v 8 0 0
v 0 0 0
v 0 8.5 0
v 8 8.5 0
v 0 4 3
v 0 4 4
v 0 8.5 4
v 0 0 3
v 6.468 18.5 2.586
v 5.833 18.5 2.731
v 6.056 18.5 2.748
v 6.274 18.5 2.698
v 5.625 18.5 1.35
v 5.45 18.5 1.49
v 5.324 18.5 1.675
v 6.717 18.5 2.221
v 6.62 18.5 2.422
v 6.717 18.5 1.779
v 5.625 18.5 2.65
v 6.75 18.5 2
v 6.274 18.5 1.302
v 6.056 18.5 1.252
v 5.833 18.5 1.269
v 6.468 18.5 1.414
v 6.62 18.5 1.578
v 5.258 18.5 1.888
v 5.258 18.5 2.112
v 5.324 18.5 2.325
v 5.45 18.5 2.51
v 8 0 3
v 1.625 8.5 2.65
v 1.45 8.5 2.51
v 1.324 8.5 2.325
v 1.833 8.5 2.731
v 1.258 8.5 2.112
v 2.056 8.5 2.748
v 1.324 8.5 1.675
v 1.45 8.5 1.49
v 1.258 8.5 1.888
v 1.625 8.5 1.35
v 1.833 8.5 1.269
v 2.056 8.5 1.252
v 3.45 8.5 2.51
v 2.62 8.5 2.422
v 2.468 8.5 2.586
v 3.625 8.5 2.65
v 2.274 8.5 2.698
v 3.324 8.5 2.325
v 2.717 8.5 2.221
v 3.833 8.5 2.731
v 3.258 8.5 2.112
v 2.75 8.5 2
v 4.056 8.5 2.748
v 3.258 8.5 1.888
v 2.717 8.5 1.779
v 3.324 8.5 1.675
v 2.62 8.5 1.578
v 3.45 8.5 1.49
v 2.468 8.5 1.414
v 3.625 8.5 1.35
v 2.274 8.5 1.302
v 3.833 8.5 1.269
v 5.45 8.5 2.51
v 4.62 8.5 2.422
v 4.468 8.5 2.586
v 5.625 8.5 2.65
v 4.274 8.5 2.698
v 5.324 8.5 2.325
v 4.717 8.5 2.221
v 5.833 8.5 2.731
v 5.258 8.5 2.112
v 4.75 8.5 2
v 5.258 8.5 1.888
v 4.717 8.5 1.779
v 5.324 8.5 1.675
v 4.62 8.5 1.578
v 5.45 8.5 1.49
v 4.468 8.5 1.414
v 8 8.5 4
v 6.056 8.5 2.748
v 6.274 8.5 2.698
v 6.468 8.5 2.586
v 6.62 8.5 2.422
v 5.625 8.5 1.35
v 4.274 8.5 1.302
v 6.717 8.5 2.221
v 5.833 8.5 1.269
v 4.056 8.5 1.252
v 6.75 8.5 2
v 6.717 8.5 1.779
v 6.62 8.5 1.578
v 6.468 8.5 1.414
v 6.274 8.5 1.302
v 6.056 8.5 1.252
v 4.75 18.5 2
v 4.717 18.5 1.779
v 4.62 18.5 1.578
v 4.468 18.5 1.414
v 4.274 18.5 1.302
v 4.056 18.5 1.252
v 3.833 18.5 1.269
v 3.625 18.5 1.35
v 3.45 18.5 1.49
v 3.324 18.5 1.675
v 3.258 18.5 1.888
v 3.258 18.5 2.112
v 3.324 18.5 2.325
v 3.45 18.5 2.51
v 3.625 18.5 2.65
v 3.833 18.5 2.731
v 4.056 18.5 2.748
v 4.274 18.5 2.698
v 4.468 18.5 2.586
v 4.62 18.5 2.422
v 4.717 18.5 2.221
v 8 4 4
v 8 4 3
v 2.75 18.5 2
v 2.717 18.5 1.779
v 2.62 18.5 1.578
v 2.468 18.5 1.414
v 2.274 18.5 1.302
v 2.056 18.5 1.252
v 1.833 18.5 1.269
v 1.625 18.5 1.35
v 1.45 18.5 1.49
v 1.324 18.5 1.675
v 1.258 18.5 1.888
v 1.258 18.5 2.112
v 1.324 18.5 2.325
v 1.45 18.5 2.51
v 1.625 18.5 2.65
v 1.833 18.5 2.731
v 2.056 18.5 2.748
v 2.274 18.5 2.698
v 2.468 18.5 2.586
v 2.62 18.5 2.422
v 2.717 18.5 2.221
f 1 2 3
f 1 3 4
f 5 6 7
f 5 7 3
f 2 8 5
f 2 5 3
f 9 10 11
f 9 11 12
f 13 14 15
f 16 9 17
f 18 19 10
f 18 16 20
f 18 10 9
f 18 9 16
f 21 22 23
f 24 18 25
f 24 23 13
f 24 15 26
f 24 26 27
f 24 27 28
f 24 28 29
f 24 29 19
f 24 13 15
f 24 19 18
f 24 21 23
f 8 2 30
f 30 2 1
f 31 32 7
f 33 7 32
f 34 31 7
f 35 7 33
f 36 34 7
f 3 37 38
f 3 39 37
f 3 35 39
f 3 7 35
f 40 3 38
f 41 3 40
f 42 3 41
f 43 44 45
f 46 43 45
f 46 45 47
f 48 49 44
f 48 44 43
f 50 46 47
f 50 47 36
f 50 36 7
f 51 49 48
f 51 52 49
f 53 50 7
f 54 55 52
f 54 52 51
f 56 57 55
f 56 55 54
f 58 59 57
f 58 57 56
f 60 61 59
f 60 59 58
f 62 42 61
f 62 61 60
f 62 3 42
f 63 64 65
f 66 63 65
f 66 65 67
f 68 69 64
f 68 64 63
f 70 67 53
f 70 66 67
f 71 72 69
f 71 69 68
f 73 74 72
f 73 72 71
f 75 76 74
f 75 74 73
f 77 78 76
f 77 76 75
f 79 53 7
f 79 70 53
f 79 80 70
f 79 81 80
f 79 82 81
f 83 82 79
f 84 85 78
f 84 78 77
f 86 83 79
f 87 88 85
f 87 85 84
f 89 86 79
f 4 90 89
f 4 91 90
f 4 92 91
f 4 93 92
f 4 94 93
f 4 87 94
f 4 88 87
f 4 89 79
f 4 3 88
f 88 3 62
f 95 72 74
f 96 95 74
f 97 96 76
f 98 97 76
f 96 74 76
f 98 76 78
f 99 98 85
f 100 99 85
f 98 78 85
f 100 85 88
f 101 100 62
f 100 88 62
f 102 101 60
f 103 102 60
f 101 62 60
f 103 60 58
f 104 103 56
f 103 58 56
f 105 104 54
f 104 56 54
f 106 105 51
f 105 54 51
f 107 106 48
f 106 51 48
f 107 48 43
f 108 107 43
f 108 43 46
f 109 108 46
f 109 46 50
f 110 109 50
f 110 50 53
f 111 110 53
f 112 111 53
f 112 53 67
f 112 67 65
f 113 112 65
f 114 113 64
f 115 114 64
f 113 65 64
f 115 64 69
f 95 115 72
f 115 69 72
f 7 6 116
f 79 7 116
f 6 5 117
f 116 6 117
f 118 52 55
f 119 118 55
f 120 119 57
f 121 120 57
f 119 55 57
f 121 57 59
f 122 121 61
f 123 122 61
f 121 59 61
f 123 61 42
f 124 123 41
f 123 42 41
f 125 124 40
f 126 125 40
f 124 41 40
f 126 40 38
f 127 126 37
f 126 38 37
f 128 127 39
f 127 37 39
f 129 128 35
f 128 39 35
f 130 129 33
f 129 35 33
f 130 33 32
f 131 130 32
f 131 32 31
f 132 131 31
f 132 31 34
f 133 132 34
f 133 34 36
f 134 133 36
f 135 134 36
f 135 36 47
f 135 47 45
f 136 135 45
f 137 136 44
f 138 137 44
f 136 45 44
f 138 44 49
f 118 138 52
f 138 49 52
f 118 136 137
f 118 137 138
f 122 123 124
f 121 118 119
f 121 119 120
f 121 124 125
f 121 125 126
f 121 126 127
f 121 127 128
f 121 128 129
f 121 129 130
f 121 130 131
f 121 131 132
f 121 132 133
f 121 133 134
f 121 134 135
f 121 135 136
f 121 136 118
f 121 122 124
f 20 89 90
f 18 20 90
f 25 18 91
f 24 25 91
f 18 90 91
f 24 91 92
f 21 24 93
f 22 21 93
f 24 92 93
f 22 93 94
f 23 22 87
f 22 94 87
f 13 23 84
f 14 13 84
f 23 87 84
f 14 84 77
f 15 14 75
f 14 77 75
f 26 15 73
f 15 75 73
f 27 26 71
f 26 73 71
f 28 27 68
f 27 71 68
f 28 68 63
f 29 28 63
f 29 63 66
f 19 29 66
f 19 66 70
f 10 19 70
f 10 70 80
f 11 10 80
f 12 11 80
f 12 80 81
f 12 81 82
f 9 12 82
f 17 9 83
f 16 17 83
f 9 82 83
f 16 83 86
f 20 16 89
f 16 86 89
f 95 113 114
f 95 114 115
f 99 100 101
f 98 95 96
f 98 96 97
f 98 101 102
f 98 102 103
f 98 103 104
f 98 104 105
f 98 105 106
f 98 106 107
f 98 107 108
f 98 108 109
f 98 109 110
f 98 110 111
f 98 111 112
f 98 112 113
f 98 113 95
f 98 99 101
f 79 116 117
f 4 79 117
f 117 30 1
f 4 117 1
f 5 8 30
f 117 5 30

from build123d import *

# Parameters (mm, degrees)
ESQUISSE1_W      = 8
ESQUISSE1_H      = 3
EXTRUSION1_DEPTH = 4
ESQUISSE2_W      = 8
ESQUISSE2_H      = 4
EXTRUSION2_DEPTH = 4.5
ESQUISSE3_R      = 0.75
EXTRUSION3_DEPTH = 10


with BuildPart() as part:
    # Esquisse1 → Extrusion1 (new body)
    with BuildSketch(Plane(origin=(0, 0, 0), x_dir=(1, 0, 0), z_dir=(0, 1, 0))):
        with Locations((4, -1.5)):
            Rectangle(ESQUISSE1_W, ESQUISSE1_H)
    extrude(amount=EXTRUSION1_DEPTH)

    # Esquisse2 → Extrusion2 (add)
    with BuildSketch(Plane(origin=(0, 4, 0), x_dir=(1, 0, 0), z_dir=(0, 1, 0))):
        with Locations((4, -2)):
            Rectangle(ESQUISSE2_W, ESQUISSE2_H)
    extrude(amount=EXTRUSION2_DEPTH)

    # Esquisse3 → Extrusion3 (add)
    with BuildSketch(Plane(origin=(0, 8.5, 0), x_dir=(1, 0, 0), z_dir=(0, 1, 0))):
        with Locations((4, -2)):
            Circle(ESQUISSE3_R)
        with Locations((2, -2)):
            Circle(ESQUISSE3_R)
        with Locations((6, -2)):
            Circle(ESQUISSE3_R)
    extrude(amount=EXTRUSION3_DEPTH)


solid = part.part
